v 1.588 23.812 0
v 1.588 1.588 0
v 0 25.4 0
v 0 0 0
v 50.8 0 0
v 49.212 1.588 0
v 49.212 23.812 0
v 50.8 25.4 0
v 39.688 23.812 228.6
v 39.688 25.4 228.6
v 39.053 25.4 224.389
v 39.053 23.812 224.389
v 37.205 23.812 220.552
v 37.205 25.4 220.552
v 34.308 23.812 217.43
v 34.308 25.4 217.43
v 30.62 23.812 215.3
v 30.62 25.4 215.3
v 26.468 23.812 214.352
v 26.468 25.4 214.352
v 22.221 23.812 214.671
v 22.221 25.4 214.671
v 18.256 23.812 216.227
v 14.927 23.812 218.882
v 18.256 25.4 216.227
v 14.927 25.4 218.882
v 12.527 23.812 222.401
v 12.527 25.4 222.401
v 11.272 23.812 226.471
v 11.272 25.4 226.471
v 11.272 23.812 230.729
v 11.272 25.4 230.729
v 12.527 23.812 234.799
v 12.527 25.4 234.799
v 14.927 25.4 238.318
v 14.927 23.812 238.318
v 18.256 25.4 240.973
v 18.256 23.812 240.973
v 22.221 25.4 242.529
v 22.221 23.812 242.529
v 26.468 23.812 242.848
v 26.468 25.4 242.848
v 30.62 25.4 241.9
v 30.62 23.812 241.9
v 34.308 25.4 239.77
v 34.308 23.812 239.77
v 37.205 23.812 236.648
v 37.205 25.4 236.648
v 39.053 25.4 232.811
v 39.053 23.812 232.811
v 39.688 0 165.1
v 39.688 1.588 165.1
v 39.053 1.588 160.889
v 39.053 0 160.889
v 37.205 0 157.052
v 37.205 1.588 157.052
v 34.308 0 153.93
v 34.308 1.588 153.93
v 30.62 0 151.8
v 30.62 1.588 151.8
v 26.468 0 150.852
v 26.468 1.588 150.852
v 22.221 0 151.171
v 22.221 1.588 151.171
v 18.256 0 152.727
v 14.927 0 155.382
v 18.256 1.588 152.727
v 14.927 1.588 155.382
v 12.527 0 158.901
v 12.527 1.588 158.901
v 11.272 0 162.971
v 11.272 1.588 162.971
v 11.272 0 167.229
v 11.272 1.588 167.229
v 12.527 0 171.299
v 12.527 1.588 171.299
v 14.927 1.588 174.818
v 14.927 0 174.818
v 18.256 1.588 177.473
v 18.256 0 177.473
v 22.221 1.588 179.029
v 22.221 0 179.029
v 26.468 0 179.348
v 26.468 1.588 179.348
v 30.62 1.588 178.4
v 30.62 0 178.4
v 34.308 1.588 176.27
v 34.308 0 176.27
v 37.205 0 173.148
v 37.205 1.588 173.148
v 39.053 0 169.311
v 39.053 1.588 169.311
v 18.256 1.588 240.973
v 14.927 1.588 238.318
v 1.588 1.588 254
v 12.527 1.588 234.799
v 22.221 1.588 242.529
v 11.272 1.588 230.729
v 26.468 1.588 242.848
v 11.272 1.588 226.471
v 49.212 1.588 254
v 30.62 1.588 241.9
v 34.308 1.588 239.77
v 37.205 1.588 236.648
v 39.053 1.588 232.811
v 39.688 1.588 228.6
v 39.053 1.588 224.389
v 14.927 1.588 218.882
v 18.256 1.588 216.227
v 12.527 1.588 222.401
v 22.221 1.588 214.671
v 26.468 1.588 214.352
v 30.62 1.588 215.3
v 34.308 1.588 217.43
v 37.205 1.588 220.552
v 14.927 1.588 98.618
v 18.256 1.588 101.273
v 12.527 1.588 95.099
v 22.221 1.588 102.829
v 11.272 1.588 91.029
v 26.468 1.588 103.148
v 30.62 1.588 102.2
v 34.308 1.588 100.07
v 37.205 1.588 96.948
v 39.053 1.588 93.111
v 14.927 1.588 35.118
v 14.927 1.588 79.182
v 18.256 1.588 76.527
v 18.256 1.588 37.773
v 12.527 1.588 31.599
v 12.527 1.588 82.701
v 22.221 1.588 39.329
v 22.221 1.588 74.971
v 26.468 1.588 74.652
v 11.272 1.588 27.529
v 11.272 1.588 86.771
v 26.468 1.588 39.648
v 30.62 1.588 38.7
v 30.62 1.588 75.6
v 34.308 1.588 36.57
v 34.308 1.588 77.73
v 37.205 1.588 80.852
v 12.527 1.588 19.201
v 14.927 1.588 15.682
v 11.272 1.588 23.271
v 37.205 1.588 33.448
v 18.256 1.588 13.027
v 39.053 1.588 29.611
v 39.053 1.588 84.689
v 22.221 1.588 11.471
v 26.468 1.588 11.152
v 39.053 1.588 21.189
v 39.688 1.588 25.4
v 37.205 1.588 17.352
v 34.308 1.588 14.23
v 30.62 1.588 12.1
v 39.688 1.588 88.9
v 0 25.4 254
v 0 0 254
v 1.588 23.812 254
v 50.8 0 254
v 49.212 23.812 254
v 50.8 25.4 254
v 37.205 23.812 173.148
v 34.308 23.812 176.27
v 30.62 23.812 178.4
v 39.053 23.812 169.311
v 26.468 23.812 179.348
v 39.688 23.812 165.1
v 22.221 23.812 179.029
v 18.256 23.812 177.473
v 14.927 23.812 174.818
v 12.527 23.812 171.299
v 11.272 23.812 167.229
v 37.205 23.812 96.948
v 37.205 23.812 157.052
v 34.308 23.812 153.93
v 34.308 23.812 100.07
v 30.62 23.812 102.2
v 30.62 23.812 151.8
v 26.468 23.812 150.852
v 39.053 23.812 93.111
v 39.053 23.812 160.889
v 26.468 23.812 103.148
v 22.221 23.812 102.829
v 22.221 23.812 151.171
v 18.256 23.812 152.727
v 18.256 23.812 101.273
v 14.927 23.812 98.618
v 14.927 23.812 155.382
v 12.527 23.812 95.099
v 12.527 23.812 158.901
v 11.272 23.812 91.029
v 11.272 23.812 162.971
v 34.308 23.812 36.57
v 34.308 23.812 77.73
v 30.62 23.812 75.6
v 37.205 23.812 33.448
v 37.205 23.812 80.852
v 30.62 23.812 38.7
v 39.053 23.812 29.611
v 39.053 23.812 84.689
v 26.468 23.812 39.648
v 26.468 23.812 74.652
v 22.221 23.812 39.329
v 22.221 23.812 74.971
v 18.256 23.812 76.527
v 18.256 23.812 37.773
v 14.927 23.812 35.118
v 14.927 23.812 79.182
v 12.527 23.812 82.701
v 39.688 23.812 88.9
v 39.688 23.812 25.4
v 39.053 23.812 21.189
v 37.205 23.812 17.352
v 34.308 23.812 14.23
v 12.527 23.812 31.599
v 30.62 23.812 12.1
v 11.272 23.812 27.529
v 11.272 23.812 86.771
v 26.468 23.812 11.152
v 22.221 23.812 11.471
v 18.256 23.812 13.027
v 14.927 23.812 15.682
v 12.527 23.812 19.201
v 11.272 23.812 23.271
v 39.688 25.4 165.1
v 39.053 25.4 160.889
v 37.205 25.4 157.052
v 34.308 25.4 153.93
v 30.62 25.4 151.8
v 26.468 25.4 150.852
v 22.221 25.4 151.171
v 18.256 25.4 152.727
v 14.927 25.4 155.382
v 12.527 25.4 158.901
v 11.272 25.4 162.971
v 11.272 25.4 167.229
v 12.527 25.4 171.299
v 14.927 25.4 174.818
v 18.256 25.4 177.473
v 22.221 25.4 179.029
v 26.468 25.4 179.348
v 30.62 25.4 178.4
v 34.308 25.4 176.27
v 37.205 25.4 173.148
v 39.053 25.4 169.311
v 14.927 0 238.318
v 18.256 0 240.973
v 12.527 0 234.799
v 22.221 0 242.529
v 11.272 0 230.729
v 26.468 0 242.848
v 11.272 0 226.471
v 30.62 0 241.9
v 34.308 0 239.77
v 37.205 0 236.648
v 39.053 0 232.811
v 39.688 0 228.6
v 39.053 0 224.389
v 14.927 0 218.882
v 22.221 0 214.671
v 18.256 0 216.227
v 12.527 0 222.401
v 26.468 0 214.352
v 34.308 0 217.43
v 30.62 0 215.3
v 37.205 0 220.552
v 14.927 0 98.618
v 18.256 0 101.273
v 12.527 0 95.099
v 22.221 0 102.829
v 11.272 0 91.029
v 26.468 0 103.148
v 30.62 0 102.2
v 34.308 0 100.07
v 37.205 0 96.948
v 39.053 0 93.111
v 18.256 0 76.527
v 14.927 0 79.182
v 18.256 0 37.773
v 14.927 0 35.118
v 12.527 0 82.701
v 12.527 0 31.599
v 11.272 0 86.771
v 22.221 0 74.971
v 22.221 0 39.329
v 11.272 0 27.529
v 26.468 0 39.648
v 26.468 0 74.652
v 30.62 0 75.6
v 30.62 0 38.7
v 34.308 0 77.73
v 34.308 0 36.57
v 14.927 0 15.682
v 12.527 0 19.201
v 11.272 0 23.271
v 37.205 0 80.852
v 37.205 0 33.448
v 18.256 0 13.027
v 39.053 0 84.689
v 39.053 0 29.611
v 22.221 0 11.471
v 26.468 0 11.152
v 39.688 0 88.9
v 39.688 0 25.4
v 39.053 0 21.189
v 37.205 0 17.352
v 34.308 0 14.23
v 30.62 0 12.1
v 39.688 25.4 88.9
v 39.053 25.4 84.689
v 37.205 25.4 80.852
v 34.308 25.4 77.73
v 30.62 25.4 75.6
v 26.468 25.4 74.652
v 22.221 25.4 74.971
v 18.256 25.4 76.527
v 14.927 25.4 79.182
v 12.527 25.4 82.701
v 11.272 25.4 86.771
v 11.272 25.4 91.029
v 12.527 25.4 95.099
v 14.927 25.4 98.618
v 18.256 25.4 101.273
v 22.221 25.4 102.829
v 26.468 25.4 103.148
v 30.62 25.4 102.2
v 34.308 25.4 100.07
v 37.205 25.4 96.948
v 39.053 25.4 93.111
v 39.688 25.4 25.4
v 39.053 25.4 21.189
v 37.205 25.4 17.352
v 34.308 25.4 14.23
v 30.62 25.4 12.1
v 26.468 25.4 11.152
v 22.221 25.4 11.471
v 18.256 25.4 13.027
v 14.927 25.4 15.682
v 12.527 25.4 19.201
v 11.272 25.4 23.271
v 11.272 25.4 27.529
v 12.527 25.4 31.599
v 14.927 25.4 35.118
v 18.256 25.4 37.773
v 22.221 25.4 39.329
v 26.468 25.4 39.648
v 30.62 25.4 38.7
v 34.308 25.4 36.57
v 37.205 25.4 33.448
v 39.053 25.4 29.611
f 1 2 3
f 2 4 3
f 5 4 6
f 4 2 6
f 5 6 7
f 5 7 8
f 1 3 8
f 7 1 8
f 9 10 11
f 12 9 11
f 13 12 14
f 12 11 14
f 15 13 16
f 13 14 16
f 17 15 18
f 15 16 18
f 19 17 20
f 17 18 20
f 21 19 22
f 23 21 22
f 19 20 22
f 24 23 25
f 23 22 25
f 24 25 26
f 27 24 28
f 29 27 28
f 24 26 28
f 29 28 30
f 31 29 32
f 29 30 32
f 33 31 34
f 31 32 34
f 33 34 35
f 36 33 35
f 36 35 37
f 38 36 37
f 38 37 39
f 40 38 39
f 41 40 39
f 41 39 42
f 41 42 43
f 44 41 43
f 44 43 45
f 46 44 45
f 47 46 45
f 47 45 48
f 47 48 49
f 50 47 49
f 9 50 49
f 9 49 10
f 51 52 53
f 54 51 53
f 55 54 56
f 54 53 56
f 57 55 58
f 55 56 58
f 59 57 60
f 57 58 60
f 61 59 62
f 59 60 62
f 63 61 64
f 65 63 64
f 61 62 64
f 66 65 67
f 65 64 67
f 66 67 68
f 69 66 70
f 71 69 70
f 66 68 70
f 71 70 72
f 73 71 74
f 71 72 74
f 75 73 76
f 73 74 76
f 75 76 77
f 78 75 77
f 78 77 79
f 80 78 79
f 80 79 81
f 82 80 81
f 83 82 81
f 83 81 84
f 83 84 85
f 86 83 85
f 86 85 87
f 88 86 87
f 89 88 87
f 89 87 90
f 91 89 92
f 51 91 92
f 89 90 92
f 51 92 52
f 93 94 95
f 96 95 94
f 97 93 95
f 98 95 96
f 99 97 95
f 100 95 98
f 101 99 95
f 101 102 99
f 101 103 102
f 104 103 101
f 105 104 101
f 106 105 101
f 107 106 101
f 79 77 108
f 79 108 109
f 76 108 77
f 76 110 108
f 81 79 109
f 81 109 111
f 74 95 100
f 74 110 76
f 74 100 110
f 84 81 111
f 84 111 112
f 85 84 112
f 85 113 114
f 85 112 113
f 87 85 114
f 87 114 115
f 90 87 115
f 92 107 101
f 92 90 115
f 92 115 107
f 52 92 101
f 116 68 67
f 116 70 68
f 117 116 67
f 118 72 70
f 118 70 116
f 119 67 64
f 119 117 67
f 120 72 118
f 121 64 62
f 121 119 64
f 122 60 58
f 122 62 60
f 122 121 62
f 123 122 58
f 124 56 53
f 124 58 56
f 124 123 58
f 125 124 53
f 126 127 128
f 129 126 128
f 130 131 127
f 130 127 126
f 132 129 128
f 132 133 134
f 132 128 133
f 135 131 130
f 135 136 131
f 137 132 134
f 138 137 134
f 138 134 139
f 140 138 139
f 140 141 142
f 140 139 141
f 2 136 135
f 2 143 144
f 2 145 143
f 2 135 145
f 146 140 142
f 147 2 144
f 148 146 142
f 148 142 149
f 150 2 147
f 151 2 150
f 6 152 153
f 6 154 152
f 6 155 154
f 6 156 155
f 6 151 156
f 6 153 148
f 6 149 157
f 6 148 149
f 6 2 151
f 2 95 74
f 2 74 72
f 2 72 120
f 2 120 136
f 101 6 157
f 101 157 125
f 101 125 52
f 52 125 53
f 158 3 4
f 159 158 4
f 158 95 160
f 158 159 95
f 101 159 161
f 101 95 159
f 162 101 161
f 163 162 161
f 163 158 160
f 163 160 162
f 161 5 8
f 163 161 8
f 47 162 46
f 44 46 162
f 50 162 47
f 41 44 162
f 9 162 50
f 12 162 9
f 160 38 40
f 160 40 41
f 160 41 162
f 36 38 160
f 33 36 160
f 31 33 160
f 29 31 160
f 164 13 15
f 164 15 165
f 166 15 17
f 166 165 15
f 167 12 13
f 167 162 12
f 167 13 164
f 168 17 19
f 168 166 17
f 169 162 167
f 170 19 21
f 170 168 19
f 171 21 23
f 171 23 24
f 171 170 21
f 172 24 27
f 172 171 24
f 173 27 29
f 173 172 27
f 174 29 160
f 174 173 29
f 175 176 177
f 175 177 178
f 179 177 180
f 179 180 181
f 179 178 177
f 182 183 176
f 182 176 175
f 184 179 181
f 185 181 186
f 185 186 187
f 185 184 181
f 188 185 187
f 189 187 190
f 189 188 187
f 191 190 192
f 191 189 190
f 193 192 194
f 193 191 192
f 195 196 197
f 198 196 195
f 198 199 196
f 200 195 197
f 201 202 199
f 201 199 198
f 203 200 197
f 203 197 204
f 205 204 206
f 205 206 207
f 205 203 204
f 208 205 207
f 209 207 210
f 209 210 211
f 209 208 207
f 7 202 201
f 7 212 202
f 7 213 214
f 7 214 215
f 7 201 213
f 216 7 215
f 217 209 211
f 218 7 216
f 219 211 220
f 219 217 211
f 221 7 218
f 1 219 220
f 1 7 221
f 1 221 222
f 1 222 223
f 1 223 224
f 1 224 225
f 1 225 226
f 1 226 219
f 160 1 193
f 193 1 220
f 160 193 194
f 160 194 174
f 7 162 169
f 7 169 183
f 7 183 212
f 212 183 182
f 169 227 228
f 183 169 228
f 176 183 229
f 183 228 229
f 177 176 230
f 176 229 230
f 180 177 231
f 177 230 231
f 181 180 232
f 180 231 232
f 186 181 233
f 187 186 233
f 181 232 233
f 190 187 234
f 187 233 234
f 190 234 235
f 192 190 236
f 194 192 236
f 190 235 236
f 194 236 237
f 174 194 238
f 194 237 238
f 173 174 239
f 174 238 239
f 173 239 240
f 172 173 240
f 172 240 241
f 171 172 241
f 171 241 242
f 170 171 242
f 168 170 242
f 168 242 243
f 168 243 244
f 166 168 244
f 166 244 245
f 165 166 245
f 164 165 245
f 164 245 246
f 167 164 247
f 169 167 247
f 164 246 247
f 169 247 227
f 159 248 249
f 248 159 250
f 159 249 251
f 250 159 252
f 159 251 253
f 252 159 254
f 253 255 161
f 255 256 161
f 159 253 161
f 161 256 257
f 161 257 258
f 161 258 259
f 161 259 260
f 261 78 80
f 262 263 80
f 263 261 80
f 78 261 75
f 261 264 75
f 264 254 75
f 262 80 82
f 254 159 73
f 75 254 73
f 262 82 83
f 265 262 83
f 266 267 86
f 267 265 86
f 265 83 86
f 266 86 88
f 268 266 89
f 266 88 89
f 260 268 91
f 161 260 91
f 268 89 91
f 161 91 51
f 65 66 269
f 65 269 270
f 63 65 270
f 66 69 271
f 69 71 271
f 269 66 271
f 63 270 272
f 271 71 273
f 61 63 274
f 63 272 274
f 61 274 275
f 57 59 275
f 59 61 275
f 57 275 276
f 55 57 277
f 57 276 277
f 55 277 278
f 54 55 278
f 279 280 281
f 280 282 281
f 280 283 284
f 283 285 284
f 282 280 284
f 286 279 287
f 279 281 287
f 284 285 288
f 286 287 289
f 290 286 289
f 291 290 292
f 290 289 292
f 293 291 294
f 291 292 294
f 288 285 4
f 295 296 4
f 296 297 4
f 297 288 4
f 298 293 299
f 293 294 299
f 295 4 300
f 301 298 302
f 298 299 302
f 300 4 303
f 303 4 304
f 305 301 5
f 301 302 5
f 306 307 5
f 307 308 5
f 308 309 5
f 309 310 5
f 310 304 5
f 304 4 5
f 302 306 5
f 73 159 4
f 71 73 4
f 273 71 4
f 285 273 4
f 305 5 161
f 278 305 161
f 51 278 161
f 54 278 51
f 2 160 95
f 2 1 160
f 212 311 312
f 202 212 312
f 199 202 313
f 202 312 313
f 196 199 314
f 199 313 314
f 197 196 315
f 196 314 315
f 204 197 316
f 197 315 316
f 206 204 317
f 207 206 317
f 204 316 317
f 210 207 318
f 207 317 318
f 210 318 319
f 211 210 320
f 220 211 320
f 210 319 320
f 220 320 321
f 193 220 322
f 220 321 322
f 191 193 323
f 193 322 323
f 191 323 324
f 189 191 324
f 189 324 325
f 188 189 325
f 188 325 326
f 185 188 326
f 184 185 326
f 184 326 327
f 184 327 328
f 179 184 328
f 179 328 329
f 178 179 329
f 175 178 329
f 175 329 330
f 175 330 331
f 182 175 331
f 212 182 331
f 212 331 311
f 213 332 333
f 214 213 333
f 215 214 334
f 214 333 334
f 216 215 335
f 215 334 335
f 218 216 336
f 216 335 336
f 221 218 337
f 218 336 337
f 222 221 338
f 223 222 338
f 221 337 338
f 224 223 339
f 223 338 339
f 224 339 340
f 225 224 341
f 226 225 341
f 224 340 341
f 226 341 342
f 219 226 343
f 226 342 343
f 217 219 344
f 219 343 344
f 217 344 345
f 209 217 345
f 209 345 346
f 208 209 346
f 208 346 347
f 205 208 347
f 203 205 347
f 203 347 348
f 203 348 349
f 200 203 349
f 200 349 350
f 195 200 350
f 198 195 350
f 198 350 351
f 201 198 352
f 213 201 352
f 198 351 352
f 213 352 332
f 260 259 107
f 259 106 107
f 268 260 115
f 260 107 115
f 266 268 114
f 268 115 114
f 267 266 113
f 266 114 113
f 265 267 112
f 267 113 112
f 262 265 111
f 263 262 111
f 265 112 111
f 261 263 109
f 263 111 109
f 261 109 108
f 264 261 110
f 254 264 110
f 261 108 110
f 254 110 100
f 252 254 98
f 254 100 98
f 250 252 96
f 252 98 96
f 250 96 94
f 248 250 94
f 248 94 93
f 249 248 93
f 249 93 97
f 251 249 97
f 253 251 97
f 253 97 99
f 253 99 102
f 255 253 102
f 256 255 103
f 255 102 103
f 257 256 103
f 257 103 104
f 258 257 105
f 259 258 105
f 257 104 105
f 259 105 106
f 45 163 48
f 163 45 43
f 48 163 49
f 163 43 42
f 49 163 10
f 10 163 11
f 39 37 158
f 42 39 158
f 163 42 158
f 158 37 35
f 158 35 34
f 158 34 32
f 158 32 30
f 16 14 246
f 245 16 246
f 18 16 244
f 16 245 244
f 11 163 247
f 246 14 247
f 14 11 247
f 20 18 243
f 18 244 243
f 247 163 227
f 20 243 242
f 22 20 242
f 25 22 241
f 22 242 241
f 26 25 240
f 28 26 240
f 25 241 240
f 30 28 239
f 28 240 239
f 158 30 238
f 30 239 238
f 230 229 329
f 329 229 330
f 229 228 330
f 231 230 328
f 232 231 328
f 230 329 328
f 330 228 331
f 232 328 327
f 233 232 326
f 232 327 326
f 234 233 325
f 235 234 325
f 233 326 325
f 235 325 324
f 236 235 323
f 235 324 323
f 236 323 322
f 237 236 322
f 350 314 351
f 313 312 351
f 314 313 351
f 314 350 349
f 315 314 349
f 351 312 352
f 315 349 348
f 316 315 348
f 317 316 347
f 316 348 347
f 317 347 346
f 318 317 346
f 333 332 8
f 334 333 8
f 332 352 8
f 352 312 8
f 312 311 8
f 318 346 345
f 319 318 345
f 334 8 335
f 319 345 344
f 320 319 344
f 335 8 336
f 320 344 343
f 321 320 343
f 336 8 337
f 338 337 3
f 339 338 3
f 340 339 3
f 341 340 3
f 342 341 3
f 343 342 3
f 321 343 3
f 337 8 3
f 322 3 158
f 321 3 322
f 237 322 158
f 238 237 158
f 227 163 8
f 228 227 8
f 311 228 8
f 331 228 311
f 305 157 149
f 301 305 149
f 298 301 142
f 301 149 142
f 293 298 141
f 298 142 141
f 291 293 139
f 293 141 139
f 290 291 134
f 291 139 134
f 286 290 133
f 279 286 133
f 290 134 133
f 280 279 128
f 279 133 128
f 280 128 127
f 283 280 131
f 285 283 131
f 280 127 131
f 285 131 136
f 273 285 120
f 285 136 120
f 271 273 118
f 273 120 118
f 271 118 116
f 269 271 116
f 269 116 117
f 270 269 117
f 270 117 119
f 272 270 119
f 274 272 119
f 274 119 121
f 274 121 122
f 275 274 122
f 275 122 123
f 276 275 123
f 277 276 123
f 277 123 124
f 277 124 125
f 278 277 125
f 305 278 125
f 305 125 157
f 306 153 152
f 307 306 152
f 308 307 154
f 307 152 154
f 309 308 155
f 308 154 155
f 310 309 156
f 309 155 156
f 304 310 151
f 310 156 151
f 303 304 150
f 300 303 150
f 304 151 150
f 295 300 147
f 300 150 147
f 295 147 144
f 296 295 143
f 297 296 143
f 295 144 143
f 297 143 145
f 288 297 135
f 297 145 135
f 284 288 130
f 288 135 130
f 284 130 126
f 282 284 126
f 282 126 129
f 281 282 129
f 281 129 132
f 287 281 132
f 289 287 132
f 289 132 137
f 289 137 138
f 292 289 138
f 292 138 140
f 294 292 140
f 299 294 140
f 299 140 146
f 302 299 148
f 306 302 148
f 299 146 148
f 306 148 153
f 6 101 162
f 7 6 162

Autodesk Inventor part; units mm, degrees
ref_plane "YZ Plane" through (0, 0, 0) normal (1, 0, 0) x (0, 1, 0)
ref_plane "XZ Plane" through (0, 0, 0) normal (0, 1, 0) x (-1, 0, 0)
ref_plane "XY Plane" through (0, 0, 0) normal (0, 0, 1) x (1, 0, 0)
sketch "Sketch1" plane through (0, 0, 0) normal (0, 0, 1) x (1, 0, 0)
  line L0 (0, 0) -> (50.8, 0)
  line L1 (50.8, 0) -> (50.8, 25.4)
  line L2 (50.8, 25.4) -> (0, 25.4)
  line L3 (0, 25.4) -> (0, 0)
  dimension "d0" = 50.8
  dimension "d1" = 25.4
extrude "Extrusion1" add sketch "Sketch1" along normal blind 254
shell "Shell1" thickness 1.5875 removed faces 2 at (16.9333, 8.4667, 0) at (16.9333, 8.4667, 254)
sketch "Sketch2" plane through (0, 25.4, 0) normal (0, 1, 0) x (1, 0, 0)
  circle A0 centre (25.4, -25.4) radius 14.2875
  circle A1 centre (25.4, -228.6) radius 14.2875
  line L0 (0, -254) -> (50.8, -254) projected
  line L1 (50.8, 0) -> (0, 0) projected
  line L2 (0, 0) -> (0, -254) projected
  circle A2 centre (25.4, -88.9) radius 14.2875
  circle A3 centre (25.4, -165.1) radius 14.2875
  dimension "d5" = 25.4
  dimension "d6" = 25.4
  dimension "d7" = 25.4
  dimension "d8" = 25.4
  dimension "d9" = 28.575
  dimension "d12" = 25.4
  dimension "d13" = 25.4
  dimension "d14" = 76.2
  dimension "d15" = 88.9
extrude "Extrusion2" cut sketch "Sketch2" against normal through all
equation "\"d2\" = Length"
equation "\"d6\" = d5"
equation "\"d7\" = d6"
equation "\"d8\" = d5"
equation "\"d12\" = d13"
equation "\"d13\" = d8"
equation "\"Length\" = 254"
properties part number "Main body"
